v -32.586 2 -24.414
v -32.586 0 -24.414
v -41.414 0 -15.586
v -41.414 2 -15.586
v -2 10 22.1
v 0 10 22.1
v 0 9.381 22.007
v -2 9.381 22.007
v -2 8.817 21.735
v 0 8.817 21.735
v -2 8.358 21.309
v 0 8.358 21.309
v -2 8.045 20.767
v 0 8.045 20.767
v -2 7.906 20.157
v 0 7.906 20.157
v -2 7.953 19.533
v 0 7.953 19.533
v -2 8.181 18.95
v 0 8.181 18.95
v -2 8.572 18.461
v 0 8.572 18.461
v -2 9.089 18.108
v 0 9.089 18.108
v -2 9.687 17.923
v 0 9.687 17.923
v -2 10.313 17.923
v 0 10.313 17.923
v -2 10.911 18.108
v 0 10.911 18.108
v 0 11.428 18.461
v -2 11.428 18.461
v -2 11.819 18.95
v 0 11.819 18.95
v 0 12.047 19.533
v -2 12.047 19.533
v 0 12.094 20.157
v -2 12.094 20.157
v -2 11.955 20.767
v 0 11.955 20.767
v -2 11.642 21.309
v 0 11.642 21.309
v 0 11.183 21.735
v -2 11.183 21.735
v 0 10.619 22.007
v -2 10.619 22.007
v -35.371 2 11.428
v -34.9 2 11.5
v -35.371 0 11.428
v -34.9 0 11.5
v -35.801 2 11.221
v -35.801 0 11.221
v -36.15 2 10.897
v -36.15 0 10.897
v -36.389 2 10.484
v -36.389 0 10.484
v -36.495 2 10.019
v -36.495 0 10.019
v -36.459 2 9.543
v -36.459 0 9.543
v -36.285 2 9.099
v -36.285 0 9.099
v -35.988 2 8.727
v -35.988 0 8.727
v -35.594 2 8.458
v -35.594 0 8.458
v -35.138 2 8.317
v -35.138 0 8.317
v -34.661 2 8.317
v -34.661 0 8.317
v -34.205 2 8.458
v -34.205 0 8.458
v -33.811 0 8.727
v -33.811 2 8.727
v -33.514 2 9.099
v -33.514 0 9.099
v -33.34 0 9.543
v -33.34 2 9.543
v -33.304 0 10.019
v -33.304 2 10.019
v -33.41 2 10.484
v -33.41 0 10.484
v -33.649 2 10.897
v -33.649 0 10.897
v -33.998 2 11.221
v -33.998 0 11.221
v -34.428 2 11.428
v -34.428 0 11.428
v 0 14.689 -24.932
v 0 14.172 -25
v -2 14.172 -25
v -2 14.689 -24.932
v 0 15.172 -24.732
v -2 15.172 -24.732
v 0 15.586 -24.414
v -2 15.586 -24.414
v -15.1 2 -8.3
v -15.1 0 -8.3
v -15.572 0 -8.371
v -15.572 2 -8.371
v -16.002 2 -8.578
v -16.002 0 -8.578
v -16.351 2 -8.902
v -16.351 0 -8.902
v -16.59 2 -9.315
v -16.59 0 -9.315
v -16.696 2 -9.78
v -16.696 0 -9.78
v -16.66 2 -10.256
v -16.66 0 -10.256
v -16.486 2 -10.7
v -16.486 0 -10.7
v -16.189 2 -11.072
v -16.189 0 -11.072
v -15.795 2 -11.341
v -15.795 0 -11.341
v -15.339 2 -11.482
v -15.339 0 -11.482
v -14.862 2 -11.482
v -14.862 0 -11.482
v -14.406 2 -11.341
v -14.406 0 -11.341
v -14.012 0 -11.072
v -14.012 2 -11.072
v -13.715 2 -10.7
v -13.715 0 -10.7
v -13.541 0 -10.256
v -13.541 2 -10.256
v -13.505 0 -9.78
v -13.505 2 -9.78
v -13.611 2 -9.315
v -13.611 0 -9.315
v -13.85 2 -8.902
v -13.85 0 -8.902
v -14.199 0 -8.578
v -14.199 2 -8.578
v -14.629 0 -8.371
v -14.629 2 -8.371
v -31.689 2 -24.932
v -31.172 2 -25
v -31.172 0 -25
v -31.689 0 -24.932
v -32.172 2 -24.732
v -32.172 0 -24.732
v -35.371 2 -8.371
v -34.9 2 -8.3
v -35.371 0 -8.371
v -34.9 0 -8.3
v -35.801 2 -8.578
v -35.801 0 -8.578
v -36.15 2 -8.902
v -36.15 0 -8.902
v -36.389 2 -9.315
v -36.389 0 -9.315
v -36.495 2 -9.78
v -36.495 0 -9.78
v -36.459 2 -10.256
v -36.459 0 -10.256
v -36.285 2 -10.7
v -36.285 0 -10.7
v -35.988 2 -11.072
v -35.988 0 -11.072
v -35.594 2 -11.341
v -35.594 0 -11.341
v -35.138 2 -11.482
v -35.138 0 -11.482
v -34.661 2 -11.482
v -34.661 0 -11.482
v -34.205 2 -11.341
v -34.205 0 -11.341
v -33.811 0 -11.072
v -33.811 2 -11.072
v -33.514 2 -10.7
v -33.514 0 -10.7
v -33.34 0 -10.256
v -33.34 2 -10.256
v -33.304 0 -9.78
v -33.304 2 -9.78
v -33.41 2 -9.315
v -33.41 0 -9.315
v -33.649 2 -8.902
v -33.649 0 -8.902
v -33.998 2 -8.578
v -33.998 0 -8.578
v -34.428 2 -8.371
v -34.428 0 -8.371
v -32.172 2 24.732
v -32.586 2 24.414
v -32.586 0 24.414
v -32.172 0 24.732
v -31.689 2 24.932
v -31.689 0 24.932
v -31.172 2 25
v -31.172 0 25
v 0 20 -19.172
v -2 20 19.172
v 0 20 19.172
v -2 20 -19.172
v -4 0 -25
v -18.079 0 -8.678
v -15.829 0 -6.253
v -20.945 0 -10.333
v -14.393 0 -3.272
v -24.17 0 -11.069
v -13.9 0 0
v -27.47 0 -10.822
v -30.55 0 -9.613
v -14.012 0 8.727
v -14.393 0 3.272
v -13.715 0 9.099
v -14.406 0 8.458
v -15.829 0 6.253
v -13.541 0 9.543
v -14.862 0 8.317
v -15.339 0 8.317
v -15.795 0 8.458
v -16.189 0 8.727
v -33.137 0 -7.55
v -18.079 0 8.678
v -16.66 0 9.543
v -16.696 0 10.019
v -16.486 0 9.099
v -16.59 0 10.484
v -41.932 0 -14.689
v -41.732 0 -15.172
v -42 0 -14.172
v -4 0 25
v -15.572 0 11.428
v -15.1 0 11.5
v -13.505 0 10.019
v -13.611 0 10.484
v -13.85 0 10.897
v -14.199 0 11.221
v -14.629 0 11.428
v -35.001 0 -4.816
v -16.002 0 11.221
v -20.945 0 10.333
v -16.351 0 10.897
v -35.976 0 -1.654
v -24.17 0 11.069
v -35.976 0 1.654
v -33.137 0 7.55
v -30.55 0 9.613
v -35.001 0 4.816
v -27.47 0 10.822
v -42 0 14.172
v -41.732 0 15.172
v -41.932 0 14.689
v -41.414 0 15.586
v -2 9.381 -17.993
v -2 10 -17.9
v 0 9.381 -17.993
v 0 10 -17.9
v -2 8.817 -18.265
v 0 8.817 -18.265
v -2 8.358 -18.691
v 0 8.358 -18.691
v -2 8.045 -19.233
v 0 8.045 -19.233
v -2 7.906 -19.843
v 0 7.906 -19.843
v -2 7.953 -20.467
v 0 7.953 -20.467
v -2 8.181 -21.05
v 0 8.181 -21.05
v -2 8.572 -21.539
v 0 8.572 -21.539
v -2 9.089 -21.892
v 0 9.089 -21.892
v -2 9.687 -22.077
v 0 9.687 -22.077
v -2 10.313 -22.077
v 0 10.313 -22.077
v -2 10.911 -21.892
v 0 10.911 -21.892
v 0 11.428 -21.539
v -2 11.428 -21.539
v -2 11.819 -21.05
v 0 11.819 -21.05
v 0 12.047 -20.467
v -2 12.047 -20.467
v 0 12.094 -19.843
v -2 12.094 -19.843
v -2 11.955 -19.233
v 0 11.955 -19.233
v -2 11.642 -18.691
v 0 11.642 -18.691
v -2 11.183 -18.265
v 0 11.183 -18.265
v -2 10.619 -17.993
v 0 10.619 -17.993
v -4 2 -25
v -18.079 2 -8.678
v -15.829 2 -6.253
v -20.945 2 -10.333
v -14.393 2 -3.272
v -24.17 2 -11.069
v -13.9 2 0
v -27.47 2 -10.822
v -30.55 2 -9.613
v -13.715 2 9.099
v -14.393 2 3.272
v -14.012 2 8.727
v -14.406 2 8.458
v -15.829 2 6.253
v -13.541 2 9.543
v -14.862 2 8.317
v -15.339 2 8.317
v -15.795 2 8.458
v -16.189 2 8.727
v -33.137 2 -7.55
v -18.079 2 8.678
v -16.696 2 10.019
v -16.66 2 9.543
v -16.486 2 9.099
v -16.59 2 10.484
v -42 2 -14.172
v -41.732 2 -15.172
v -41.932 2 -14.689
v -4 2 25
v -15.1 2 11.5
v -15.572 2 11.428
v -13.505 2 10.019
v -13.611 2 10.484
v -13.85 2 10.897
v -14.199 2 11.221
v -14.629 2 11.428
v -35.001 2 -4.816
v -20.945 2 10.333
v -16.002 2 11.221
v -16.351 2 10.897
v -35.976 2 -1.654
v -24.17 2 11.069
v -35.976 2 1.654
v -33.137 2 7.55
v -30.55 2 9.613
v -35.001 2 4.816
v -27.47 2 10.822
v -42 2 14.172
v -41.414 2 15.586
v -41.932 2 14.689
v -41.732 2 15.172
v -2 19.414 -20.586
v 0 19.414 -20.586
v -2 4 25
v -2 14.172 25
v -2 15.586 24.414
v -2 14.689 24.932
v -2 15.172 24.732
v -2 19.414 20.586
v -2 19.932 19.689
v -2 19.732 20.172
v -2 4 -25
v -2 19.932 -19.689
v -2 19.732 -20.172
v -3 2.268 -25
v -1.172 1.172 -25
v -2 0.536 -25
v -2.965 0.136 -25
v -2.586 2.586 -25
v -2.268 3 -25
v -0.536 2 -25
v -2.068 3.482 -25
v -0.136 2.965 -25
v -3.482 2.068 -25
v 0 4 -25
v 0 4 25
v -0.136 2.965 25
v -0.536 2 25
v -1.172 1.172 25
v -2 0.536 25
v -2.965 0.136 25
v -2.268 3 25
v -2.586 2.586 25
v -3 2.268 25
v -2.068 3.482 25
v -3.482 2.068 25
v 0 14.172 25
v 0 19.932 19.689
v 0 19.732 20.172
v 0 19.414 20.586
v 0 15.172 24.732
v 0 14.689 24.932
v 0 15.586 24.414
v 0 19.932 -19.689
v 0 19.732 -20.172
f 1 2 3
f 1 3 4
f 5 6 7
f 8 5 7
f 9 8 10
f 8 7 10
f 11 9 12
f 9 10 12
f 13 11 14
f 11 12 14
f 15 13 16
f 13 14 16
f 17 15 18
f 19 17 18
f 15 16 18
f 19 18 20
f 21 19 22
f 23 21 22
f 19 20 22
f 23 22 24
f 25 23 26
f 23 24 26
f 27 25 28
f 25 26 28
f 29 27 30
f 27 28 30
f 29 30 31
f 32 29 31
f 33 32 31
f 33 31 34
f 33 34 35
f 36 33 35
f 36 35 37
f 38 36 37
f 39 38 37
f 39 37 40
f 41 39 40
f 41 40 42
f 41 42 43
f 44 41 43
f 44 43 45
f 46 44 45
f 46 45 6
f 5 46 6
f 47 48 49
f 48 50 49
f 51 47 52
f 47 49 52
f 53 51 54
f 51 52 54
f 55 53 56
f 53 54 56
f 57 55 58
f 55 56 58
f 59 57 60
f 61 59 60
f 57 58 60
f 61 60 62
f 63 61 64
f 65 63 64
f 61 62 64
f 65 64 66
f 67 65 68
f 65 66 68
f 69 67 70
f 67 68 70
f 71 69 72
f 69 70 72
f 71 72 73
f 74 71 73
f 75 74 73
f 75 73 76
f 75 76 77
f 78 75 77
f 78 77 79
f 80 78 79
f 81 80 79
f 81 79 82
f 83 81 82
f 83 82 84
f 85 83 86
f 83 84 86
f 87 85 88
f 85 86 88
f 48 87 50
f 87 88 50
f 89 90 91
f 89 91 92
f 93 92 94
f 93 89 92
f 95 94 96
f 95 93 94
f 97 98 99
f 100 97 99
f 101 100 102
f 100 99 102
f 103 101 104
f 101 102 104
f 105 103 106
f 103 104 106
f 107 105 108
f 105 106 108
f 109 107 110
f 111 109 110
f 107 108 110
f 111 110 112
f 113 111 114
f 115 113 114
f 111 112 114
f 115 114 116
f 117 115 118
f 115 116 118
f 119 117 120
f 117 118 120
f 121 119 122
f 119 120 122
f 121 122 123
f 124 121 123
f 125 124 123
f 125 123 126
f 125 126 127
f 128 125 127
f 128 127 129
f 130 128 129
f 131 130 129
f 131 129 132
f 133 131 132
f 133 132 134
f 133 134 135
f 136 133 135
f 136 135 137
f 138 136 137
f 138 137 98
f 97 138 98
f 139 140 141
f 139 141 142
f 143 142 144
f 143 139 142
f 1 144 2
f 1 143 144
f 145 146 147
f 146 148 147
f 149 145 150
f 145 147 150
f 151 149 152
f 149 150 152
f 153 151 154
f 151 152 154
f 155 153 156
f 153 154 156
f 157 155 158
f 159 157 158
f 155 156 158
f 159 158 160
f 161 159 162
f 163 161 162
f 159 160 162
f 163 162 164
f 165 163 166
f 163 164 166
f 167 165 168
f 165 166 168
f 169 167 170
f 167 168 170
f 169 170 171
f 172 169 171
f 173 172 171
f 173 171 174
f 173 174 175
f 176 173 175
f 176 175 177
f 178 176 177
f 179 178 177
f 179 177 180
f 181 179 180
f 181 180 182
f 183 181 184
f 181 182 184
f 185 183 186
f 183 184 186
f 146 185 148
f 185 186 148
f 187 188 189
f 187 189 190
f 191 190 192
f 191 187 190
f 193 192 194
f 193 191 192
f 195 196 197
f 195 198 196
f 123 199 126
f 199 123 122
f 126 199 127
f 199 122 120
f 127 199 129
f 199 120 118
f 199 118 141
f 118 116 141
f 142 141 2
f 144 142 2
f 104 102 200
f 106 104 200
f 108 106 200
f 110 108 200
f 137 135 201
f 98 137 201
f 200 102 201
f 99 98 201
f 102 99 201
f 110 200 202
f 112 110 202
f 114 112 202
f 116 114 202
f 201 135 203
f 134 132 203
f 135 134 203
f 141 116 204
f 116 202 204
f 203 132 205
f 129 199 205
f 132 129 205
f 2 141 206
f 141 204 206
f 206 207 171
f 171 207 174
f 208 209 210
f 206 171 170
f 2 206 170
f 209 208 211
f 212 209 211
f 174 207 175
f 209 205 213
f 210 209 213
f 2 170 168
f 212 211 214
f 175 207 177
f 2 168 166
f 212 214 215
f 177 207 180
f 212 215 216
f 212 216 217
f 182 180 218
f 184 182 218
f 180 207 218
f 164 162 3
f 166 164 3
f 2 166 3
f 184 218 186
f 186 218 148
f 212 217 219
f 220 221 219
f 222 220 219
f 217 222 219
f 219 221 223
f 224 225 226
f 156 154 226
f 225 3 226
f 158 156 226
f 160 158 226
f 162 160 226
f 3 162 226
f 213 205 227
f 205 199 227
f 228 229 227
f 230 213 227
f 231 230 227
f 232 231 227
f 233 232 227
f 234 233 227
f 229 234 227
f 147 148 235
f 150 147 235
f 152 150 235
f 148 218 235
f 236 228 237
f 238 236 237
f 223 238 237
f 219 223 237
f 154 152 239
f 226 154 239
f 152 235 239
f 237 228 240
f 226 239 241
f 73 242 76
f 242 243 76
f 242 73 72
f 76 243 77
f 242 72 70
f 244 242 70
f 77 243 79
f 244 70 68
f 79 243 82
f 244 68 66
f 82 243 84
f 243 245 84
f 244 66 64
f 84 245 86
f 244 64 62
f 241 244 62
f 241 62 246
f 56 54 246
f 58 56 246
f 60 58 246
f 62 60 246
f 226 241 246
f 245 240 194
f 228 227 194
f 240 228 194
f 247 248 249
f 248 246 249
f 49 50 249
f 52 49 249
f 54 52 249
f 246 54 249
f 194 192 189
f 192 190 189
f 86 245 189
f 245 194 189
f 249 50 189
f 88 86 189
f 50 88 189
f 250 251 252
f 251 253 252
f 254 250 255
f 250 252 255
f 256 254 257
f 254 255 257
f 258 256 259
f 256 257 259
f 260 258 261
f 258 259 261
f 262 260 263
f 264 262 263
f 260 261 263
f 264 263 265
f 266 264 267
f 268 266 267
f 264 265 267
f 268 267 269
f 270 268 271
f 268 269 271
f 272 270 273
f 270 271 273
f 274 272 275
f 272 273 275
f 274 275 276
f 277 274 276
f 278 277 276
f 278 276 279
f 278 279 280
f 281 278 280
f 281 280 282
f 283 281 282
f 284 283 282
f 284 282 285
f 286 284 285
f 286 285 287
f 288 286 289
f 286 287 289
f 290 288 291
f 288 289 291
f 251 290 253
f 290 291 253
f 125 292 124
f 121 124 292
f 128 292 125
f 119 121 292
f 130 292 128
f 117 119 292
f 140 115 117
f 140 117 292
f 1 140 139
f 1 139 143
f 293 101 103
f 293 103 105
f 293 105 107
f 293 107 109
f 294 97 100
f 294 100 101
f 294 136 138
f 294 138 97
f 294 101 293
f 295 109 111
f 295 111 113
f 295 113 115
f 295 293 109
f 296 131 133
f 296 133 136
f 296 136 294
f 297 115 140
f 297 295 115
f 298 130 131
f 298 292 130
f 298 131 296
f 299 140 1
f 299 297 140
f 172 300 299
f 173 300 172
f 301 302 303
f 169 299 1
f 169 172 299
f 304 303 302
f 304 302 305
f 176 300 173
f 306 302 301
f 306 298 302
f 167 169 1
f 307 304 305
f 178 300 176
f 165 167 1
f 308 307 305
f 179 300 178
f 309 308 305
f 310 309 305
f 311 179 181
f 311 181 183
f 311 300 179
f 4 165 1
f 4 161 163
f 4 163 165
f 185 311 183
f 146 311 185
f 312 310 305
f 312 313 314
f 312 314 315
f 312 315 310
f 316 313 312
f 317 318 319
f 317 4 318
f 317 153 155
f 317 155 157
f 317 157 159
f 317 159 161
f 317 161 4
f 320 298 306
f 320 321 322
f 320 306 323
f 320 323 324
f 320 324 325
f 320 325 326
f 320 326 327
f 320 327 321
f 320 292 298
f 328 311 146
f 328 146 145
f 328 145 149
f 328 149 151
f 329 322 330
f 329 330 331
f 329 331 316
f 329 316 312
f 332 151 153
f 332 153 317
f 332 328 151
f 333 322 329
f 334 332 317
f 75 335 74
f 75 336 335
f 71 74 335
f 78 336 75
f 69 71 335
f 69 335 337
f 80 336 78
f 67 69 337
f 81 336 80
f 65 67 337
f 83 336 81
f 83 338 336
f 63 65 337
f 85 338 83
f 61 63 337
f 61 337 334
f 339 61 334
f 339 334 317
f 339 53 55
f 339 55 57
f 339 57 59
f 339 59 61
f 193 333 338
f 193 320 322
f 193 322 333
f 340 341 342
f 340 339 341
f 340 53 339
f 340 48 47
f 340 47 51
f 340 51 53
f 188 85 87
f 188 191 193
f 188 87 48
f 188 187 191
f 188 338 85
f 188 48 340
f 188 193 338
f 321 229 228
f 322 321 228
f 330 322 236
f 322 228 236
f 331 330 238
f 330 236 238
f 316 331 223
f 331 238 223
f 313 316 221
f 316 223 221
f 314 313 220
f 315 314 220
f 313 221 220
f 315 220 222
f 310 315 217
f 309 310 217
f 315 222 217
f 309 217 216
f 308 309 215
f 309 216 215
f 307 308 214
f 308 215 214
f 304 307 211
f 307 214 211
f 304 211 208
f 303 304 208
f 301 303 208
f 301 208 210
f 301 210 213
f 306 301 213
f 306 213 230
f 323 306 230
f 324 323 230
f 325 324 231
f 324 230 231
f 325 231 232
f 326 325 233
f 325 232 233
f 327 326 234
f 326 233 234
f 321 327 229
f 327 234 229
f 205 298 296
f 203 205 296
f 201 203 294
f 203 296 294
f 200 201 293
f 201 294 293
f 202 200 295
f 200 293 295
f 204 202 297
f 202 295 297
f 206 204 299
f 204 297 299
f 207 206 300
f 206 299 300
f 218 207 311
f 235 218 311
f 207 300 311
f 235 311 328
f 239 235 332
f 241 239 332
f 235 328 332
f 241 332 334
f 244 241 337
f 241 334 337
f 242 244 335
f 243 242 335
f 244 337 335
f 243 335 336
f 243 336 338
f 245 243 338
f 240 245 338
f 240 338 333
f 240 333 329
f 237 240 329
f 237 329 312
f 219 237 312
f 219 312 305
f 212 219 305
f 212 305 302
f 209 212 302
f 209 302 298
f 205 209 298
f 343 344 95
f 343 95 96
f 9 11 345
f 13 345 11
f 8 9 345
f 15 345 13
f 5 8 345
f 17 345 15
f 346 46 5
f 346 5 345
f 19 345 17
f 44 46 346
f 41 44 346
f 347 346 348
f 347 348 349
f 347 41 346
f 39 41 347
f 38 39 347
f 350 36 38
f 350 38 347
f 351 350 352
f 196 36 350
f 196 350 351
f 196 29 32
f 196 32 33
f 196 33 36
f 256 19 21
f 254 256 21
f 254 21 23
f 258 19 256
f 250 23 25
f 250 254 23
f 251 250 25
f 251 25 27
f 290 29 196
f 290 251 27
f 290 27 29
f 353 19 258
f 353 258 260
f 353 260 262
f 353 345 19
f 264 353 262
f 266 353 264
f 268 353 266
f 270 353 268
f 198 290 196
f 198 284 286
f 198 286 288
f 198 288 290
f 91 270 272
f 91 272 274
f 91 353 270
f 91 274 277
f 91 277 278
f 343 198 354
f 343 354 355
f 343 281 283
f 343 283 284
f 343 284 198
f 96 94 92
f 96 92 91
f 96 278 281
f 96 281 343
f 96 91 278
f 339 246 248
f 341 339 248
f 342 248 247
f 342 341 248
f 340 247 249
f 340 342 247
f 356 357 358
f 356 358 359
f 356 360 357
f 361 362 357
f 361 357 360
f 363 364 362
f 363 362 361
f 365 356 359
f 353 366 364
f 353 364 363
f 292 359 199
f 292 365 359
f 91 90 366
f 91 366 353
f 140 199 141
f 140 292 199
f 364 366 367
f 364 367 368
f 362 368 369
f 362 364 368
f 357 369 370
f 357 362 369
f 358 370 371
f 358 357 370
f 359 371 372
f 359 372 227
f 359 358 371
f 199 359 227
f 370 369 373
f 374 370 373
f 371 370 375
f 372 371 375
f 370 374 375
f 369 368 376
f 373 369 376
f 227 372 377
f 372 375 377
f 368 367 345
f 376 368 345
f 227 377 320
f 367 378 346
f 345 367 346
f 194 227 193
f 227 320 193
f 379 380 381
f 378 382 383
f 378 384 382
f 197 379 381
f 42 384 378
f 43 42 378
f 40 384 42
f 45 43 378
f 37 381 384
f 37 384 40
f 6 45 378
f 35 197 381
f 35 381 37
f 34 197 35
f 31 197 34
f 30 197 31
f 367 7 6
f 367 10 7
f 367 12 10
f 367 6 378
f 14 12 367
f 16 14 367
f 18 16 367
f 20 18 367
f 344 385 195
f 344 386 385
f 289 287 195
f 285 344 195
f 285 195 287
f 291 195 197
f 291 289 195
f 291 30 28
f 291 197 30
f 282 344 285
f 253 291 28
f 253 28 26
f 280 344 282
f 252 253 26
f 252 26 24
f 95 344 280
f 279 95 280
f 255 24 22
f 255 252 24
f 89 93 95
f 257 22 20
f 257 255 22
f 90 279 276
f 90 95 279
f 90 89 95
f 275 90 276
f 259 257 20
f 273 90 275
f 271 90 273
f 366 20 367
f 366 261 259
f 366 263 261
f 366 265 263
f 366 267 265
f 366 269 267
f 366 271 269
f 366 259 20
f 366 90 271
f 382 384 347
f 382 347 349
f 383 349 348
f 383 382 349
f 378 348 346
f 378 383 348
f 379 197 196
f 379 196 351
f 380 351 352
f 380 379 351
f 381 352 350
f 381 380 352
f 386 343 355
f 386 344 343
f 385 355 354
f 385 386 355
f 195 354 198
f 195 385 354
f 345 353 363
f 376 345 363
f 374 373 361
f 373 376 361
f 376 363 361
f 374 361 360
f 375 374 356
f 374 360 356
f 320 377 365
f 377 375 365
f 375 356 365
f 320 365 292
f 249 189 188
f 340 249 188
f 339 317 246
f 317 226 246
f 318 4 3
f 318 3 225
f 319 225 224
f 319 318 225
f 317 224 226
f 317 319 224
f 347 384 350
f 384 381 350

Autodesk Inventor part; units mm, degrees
ref_plane "YZ Plane" through (0, 0, 0) normal (1, 0, 0) x (0, 1, 0)
ref_plane "XZ Plane" through (0, 0, 0) normal (0, 1, 0) x (-1, 0, 0)
ref_plane "XY Plane" through (0, 0, 0) normal (0, 0, 1) x (1, 0, 0)
sketch "スケッチ1" plane through (0, 0, 0) normal (0, 1, 0) x (-1, 0, 0)
  line L0 (0, -25) -> (42, -25)
  line L1 (42, -25) -> (42, 25)
  line L2 (42, 25) -> (0, 25)
  line L3 (0, 25) -> (0, -25)
  point P0 (0, 0)
  dimension "d0" = 42
  dimension "d1" = 50
  dimension "d40" = 25
extrude "プレート1" add sketch "スケッチ1" along normal blind 2
sketch "スケッチ4" plane through (0, 2, 0) normal (0, 1, 0) x (1, 0, 0)
  circle A0 centre (-25, 0) radius 11.1
  line L0 (0, 25) -> (0, -25) projected
  point P0 (0, 0)
  dimension "d23" = 22.2
  dimension "d24" = 25
extrude "押し出し1" cut sketch "スケッチ4" against normal blind 10
sketch "スケッチ5" plane through (0, 2, 0) normal (0, 1, 0) x (1, 0, 0)
  circle A0 centre (-25, 0) radius 11.1 projected
  line L0 (0, 25) -> (0, -25) projected
  line L1 (-42, 25) -> (0, 25) projected
  line L2 (-42, -25) -> (-42, 25) projected
  line L3 (0, -25) -> (-42, -25) projected
  circle A1 centre (-25, 0) radius 14
  point P0 (0, 0)
  point P1 (-34.8995, -9.8995)
  point P2 (-15.1005, -9.8995)
  point P3 (-15.1005, 9.8995)
  point P4 (-34.8995, 9.8995)
  dimension "d28" = 28
  dimension "d31" = 360
hole "穴2" at (-34.8995, 2, 9.8995) at (-15.1005, 2, 9.8995) at (-15.1005, 2, -9.8995) at (-34.8995, 2, -9.8995) direction (0, -1, 0) diameter 3.2 end through all
sketch "スケッチ10" plane through (-2, 0, -25) normal (1, 0, 0) x (0, 1, 0)
  line L0 (0, 50) -> (0, 0)
  line L1 (0, 0) -> (20, 0)
  line L2 (20, 0) -> (20, 50)
  line L3 (20, 50) -> (0, 50)
edge flange "フランジ4" height 20 angle 90 thickness 2 bend radius 2 thickness toward (1, 0, 0) relief tear relief width 2 relief depth 1 edges at (0, 2, 0) wall of the first edge with corners at (-2, 0, 25) (-2, 0, -25) (-2, 20, -25) (-2, 20, 25)
bend "曲げ4"
corner "コーナー4"
sketch "スケッチ12" plane through (-2, 20, -25) normal (-1, 0, 0) x (0, 0, 1)
  line L0 (0, -16) -> (50, -16) projected
  line L1 (50, -16) -> (50, 0) projected
  line L2 (50, 0) -> (0, 0) projected
  line L3 (0, -16) -> (0, 0) projected
  line L4 (45, -10) -> (5, -10)
  point P0 (25, -20)
  point P1 (25, -10)
  dimension "d77" = 40
  dimension "d78" = 10
  dimension "d79" = 25
  dimension "d80" = 50
hole "穴3" at (-2, 10, -20) at (-2, 10, 20) direction (1, 0, 0) diameter 4.2 end through all
chamfer "面取り1" distance 10 angle 45 2 edges at (-42, 1, 25) (-42, 1, -25)
fillet "フィレット1" radius 2 4 edges at (-32, 1, -25) (-42, 1, -15) (-42, 1, 15) (-32, 1, 25)
chamfer "面取り2" distance 5 angle 45 2 edges at (-1, 20, -25) (-1, 20, 25)
fillet "フィレット2" radius 2 4 edges at (-1, 15, -25) (-1, 20, -20) (-1, 20, 20) (-1, 15, 25)
equation "\"d38\" = Thickness"
equation "\"d79\" = 0.5 * d80"
equation "\"d86\" = Thickness"
equation "\"d2\" = Thickness"
equation "\"d67\" = BendReliefWidth"
equation "\"d68\" = BendReliefDepth"
equation "\"d69\" = MinimumRemnant"
equation "\"d70\" = TransitionRadius"
equation "\"d73\" = BendRadius"
equation "\"d74\" = CornerReliefSize"
equation "\"d75\" = GapSize"
equation "\"d76\" = JacobiRadiusSize"
equation "\"d40\" = 0.5 * d1"
equation "\"BendRadius\" = Thickness"
equation "\"BendReliefWidth\" = Thickness"
equation "\"BendReliefDepth\" = 0.5 * Thickness"
equation "\"CornerReliefSize\" = 4 * Thickness"
equation "\"MinimumRemnant\" = 2 * Thickness"
equation "\"TransitionRadius\" = BendRadius"
equation "\"JacobiRadiusSize\" = BendRadius"
equation "\"GapSize\" = Thickness"
equation "\"Thickness\" = 2"
properties part number "Belt_Unit_Motor_Holder"
